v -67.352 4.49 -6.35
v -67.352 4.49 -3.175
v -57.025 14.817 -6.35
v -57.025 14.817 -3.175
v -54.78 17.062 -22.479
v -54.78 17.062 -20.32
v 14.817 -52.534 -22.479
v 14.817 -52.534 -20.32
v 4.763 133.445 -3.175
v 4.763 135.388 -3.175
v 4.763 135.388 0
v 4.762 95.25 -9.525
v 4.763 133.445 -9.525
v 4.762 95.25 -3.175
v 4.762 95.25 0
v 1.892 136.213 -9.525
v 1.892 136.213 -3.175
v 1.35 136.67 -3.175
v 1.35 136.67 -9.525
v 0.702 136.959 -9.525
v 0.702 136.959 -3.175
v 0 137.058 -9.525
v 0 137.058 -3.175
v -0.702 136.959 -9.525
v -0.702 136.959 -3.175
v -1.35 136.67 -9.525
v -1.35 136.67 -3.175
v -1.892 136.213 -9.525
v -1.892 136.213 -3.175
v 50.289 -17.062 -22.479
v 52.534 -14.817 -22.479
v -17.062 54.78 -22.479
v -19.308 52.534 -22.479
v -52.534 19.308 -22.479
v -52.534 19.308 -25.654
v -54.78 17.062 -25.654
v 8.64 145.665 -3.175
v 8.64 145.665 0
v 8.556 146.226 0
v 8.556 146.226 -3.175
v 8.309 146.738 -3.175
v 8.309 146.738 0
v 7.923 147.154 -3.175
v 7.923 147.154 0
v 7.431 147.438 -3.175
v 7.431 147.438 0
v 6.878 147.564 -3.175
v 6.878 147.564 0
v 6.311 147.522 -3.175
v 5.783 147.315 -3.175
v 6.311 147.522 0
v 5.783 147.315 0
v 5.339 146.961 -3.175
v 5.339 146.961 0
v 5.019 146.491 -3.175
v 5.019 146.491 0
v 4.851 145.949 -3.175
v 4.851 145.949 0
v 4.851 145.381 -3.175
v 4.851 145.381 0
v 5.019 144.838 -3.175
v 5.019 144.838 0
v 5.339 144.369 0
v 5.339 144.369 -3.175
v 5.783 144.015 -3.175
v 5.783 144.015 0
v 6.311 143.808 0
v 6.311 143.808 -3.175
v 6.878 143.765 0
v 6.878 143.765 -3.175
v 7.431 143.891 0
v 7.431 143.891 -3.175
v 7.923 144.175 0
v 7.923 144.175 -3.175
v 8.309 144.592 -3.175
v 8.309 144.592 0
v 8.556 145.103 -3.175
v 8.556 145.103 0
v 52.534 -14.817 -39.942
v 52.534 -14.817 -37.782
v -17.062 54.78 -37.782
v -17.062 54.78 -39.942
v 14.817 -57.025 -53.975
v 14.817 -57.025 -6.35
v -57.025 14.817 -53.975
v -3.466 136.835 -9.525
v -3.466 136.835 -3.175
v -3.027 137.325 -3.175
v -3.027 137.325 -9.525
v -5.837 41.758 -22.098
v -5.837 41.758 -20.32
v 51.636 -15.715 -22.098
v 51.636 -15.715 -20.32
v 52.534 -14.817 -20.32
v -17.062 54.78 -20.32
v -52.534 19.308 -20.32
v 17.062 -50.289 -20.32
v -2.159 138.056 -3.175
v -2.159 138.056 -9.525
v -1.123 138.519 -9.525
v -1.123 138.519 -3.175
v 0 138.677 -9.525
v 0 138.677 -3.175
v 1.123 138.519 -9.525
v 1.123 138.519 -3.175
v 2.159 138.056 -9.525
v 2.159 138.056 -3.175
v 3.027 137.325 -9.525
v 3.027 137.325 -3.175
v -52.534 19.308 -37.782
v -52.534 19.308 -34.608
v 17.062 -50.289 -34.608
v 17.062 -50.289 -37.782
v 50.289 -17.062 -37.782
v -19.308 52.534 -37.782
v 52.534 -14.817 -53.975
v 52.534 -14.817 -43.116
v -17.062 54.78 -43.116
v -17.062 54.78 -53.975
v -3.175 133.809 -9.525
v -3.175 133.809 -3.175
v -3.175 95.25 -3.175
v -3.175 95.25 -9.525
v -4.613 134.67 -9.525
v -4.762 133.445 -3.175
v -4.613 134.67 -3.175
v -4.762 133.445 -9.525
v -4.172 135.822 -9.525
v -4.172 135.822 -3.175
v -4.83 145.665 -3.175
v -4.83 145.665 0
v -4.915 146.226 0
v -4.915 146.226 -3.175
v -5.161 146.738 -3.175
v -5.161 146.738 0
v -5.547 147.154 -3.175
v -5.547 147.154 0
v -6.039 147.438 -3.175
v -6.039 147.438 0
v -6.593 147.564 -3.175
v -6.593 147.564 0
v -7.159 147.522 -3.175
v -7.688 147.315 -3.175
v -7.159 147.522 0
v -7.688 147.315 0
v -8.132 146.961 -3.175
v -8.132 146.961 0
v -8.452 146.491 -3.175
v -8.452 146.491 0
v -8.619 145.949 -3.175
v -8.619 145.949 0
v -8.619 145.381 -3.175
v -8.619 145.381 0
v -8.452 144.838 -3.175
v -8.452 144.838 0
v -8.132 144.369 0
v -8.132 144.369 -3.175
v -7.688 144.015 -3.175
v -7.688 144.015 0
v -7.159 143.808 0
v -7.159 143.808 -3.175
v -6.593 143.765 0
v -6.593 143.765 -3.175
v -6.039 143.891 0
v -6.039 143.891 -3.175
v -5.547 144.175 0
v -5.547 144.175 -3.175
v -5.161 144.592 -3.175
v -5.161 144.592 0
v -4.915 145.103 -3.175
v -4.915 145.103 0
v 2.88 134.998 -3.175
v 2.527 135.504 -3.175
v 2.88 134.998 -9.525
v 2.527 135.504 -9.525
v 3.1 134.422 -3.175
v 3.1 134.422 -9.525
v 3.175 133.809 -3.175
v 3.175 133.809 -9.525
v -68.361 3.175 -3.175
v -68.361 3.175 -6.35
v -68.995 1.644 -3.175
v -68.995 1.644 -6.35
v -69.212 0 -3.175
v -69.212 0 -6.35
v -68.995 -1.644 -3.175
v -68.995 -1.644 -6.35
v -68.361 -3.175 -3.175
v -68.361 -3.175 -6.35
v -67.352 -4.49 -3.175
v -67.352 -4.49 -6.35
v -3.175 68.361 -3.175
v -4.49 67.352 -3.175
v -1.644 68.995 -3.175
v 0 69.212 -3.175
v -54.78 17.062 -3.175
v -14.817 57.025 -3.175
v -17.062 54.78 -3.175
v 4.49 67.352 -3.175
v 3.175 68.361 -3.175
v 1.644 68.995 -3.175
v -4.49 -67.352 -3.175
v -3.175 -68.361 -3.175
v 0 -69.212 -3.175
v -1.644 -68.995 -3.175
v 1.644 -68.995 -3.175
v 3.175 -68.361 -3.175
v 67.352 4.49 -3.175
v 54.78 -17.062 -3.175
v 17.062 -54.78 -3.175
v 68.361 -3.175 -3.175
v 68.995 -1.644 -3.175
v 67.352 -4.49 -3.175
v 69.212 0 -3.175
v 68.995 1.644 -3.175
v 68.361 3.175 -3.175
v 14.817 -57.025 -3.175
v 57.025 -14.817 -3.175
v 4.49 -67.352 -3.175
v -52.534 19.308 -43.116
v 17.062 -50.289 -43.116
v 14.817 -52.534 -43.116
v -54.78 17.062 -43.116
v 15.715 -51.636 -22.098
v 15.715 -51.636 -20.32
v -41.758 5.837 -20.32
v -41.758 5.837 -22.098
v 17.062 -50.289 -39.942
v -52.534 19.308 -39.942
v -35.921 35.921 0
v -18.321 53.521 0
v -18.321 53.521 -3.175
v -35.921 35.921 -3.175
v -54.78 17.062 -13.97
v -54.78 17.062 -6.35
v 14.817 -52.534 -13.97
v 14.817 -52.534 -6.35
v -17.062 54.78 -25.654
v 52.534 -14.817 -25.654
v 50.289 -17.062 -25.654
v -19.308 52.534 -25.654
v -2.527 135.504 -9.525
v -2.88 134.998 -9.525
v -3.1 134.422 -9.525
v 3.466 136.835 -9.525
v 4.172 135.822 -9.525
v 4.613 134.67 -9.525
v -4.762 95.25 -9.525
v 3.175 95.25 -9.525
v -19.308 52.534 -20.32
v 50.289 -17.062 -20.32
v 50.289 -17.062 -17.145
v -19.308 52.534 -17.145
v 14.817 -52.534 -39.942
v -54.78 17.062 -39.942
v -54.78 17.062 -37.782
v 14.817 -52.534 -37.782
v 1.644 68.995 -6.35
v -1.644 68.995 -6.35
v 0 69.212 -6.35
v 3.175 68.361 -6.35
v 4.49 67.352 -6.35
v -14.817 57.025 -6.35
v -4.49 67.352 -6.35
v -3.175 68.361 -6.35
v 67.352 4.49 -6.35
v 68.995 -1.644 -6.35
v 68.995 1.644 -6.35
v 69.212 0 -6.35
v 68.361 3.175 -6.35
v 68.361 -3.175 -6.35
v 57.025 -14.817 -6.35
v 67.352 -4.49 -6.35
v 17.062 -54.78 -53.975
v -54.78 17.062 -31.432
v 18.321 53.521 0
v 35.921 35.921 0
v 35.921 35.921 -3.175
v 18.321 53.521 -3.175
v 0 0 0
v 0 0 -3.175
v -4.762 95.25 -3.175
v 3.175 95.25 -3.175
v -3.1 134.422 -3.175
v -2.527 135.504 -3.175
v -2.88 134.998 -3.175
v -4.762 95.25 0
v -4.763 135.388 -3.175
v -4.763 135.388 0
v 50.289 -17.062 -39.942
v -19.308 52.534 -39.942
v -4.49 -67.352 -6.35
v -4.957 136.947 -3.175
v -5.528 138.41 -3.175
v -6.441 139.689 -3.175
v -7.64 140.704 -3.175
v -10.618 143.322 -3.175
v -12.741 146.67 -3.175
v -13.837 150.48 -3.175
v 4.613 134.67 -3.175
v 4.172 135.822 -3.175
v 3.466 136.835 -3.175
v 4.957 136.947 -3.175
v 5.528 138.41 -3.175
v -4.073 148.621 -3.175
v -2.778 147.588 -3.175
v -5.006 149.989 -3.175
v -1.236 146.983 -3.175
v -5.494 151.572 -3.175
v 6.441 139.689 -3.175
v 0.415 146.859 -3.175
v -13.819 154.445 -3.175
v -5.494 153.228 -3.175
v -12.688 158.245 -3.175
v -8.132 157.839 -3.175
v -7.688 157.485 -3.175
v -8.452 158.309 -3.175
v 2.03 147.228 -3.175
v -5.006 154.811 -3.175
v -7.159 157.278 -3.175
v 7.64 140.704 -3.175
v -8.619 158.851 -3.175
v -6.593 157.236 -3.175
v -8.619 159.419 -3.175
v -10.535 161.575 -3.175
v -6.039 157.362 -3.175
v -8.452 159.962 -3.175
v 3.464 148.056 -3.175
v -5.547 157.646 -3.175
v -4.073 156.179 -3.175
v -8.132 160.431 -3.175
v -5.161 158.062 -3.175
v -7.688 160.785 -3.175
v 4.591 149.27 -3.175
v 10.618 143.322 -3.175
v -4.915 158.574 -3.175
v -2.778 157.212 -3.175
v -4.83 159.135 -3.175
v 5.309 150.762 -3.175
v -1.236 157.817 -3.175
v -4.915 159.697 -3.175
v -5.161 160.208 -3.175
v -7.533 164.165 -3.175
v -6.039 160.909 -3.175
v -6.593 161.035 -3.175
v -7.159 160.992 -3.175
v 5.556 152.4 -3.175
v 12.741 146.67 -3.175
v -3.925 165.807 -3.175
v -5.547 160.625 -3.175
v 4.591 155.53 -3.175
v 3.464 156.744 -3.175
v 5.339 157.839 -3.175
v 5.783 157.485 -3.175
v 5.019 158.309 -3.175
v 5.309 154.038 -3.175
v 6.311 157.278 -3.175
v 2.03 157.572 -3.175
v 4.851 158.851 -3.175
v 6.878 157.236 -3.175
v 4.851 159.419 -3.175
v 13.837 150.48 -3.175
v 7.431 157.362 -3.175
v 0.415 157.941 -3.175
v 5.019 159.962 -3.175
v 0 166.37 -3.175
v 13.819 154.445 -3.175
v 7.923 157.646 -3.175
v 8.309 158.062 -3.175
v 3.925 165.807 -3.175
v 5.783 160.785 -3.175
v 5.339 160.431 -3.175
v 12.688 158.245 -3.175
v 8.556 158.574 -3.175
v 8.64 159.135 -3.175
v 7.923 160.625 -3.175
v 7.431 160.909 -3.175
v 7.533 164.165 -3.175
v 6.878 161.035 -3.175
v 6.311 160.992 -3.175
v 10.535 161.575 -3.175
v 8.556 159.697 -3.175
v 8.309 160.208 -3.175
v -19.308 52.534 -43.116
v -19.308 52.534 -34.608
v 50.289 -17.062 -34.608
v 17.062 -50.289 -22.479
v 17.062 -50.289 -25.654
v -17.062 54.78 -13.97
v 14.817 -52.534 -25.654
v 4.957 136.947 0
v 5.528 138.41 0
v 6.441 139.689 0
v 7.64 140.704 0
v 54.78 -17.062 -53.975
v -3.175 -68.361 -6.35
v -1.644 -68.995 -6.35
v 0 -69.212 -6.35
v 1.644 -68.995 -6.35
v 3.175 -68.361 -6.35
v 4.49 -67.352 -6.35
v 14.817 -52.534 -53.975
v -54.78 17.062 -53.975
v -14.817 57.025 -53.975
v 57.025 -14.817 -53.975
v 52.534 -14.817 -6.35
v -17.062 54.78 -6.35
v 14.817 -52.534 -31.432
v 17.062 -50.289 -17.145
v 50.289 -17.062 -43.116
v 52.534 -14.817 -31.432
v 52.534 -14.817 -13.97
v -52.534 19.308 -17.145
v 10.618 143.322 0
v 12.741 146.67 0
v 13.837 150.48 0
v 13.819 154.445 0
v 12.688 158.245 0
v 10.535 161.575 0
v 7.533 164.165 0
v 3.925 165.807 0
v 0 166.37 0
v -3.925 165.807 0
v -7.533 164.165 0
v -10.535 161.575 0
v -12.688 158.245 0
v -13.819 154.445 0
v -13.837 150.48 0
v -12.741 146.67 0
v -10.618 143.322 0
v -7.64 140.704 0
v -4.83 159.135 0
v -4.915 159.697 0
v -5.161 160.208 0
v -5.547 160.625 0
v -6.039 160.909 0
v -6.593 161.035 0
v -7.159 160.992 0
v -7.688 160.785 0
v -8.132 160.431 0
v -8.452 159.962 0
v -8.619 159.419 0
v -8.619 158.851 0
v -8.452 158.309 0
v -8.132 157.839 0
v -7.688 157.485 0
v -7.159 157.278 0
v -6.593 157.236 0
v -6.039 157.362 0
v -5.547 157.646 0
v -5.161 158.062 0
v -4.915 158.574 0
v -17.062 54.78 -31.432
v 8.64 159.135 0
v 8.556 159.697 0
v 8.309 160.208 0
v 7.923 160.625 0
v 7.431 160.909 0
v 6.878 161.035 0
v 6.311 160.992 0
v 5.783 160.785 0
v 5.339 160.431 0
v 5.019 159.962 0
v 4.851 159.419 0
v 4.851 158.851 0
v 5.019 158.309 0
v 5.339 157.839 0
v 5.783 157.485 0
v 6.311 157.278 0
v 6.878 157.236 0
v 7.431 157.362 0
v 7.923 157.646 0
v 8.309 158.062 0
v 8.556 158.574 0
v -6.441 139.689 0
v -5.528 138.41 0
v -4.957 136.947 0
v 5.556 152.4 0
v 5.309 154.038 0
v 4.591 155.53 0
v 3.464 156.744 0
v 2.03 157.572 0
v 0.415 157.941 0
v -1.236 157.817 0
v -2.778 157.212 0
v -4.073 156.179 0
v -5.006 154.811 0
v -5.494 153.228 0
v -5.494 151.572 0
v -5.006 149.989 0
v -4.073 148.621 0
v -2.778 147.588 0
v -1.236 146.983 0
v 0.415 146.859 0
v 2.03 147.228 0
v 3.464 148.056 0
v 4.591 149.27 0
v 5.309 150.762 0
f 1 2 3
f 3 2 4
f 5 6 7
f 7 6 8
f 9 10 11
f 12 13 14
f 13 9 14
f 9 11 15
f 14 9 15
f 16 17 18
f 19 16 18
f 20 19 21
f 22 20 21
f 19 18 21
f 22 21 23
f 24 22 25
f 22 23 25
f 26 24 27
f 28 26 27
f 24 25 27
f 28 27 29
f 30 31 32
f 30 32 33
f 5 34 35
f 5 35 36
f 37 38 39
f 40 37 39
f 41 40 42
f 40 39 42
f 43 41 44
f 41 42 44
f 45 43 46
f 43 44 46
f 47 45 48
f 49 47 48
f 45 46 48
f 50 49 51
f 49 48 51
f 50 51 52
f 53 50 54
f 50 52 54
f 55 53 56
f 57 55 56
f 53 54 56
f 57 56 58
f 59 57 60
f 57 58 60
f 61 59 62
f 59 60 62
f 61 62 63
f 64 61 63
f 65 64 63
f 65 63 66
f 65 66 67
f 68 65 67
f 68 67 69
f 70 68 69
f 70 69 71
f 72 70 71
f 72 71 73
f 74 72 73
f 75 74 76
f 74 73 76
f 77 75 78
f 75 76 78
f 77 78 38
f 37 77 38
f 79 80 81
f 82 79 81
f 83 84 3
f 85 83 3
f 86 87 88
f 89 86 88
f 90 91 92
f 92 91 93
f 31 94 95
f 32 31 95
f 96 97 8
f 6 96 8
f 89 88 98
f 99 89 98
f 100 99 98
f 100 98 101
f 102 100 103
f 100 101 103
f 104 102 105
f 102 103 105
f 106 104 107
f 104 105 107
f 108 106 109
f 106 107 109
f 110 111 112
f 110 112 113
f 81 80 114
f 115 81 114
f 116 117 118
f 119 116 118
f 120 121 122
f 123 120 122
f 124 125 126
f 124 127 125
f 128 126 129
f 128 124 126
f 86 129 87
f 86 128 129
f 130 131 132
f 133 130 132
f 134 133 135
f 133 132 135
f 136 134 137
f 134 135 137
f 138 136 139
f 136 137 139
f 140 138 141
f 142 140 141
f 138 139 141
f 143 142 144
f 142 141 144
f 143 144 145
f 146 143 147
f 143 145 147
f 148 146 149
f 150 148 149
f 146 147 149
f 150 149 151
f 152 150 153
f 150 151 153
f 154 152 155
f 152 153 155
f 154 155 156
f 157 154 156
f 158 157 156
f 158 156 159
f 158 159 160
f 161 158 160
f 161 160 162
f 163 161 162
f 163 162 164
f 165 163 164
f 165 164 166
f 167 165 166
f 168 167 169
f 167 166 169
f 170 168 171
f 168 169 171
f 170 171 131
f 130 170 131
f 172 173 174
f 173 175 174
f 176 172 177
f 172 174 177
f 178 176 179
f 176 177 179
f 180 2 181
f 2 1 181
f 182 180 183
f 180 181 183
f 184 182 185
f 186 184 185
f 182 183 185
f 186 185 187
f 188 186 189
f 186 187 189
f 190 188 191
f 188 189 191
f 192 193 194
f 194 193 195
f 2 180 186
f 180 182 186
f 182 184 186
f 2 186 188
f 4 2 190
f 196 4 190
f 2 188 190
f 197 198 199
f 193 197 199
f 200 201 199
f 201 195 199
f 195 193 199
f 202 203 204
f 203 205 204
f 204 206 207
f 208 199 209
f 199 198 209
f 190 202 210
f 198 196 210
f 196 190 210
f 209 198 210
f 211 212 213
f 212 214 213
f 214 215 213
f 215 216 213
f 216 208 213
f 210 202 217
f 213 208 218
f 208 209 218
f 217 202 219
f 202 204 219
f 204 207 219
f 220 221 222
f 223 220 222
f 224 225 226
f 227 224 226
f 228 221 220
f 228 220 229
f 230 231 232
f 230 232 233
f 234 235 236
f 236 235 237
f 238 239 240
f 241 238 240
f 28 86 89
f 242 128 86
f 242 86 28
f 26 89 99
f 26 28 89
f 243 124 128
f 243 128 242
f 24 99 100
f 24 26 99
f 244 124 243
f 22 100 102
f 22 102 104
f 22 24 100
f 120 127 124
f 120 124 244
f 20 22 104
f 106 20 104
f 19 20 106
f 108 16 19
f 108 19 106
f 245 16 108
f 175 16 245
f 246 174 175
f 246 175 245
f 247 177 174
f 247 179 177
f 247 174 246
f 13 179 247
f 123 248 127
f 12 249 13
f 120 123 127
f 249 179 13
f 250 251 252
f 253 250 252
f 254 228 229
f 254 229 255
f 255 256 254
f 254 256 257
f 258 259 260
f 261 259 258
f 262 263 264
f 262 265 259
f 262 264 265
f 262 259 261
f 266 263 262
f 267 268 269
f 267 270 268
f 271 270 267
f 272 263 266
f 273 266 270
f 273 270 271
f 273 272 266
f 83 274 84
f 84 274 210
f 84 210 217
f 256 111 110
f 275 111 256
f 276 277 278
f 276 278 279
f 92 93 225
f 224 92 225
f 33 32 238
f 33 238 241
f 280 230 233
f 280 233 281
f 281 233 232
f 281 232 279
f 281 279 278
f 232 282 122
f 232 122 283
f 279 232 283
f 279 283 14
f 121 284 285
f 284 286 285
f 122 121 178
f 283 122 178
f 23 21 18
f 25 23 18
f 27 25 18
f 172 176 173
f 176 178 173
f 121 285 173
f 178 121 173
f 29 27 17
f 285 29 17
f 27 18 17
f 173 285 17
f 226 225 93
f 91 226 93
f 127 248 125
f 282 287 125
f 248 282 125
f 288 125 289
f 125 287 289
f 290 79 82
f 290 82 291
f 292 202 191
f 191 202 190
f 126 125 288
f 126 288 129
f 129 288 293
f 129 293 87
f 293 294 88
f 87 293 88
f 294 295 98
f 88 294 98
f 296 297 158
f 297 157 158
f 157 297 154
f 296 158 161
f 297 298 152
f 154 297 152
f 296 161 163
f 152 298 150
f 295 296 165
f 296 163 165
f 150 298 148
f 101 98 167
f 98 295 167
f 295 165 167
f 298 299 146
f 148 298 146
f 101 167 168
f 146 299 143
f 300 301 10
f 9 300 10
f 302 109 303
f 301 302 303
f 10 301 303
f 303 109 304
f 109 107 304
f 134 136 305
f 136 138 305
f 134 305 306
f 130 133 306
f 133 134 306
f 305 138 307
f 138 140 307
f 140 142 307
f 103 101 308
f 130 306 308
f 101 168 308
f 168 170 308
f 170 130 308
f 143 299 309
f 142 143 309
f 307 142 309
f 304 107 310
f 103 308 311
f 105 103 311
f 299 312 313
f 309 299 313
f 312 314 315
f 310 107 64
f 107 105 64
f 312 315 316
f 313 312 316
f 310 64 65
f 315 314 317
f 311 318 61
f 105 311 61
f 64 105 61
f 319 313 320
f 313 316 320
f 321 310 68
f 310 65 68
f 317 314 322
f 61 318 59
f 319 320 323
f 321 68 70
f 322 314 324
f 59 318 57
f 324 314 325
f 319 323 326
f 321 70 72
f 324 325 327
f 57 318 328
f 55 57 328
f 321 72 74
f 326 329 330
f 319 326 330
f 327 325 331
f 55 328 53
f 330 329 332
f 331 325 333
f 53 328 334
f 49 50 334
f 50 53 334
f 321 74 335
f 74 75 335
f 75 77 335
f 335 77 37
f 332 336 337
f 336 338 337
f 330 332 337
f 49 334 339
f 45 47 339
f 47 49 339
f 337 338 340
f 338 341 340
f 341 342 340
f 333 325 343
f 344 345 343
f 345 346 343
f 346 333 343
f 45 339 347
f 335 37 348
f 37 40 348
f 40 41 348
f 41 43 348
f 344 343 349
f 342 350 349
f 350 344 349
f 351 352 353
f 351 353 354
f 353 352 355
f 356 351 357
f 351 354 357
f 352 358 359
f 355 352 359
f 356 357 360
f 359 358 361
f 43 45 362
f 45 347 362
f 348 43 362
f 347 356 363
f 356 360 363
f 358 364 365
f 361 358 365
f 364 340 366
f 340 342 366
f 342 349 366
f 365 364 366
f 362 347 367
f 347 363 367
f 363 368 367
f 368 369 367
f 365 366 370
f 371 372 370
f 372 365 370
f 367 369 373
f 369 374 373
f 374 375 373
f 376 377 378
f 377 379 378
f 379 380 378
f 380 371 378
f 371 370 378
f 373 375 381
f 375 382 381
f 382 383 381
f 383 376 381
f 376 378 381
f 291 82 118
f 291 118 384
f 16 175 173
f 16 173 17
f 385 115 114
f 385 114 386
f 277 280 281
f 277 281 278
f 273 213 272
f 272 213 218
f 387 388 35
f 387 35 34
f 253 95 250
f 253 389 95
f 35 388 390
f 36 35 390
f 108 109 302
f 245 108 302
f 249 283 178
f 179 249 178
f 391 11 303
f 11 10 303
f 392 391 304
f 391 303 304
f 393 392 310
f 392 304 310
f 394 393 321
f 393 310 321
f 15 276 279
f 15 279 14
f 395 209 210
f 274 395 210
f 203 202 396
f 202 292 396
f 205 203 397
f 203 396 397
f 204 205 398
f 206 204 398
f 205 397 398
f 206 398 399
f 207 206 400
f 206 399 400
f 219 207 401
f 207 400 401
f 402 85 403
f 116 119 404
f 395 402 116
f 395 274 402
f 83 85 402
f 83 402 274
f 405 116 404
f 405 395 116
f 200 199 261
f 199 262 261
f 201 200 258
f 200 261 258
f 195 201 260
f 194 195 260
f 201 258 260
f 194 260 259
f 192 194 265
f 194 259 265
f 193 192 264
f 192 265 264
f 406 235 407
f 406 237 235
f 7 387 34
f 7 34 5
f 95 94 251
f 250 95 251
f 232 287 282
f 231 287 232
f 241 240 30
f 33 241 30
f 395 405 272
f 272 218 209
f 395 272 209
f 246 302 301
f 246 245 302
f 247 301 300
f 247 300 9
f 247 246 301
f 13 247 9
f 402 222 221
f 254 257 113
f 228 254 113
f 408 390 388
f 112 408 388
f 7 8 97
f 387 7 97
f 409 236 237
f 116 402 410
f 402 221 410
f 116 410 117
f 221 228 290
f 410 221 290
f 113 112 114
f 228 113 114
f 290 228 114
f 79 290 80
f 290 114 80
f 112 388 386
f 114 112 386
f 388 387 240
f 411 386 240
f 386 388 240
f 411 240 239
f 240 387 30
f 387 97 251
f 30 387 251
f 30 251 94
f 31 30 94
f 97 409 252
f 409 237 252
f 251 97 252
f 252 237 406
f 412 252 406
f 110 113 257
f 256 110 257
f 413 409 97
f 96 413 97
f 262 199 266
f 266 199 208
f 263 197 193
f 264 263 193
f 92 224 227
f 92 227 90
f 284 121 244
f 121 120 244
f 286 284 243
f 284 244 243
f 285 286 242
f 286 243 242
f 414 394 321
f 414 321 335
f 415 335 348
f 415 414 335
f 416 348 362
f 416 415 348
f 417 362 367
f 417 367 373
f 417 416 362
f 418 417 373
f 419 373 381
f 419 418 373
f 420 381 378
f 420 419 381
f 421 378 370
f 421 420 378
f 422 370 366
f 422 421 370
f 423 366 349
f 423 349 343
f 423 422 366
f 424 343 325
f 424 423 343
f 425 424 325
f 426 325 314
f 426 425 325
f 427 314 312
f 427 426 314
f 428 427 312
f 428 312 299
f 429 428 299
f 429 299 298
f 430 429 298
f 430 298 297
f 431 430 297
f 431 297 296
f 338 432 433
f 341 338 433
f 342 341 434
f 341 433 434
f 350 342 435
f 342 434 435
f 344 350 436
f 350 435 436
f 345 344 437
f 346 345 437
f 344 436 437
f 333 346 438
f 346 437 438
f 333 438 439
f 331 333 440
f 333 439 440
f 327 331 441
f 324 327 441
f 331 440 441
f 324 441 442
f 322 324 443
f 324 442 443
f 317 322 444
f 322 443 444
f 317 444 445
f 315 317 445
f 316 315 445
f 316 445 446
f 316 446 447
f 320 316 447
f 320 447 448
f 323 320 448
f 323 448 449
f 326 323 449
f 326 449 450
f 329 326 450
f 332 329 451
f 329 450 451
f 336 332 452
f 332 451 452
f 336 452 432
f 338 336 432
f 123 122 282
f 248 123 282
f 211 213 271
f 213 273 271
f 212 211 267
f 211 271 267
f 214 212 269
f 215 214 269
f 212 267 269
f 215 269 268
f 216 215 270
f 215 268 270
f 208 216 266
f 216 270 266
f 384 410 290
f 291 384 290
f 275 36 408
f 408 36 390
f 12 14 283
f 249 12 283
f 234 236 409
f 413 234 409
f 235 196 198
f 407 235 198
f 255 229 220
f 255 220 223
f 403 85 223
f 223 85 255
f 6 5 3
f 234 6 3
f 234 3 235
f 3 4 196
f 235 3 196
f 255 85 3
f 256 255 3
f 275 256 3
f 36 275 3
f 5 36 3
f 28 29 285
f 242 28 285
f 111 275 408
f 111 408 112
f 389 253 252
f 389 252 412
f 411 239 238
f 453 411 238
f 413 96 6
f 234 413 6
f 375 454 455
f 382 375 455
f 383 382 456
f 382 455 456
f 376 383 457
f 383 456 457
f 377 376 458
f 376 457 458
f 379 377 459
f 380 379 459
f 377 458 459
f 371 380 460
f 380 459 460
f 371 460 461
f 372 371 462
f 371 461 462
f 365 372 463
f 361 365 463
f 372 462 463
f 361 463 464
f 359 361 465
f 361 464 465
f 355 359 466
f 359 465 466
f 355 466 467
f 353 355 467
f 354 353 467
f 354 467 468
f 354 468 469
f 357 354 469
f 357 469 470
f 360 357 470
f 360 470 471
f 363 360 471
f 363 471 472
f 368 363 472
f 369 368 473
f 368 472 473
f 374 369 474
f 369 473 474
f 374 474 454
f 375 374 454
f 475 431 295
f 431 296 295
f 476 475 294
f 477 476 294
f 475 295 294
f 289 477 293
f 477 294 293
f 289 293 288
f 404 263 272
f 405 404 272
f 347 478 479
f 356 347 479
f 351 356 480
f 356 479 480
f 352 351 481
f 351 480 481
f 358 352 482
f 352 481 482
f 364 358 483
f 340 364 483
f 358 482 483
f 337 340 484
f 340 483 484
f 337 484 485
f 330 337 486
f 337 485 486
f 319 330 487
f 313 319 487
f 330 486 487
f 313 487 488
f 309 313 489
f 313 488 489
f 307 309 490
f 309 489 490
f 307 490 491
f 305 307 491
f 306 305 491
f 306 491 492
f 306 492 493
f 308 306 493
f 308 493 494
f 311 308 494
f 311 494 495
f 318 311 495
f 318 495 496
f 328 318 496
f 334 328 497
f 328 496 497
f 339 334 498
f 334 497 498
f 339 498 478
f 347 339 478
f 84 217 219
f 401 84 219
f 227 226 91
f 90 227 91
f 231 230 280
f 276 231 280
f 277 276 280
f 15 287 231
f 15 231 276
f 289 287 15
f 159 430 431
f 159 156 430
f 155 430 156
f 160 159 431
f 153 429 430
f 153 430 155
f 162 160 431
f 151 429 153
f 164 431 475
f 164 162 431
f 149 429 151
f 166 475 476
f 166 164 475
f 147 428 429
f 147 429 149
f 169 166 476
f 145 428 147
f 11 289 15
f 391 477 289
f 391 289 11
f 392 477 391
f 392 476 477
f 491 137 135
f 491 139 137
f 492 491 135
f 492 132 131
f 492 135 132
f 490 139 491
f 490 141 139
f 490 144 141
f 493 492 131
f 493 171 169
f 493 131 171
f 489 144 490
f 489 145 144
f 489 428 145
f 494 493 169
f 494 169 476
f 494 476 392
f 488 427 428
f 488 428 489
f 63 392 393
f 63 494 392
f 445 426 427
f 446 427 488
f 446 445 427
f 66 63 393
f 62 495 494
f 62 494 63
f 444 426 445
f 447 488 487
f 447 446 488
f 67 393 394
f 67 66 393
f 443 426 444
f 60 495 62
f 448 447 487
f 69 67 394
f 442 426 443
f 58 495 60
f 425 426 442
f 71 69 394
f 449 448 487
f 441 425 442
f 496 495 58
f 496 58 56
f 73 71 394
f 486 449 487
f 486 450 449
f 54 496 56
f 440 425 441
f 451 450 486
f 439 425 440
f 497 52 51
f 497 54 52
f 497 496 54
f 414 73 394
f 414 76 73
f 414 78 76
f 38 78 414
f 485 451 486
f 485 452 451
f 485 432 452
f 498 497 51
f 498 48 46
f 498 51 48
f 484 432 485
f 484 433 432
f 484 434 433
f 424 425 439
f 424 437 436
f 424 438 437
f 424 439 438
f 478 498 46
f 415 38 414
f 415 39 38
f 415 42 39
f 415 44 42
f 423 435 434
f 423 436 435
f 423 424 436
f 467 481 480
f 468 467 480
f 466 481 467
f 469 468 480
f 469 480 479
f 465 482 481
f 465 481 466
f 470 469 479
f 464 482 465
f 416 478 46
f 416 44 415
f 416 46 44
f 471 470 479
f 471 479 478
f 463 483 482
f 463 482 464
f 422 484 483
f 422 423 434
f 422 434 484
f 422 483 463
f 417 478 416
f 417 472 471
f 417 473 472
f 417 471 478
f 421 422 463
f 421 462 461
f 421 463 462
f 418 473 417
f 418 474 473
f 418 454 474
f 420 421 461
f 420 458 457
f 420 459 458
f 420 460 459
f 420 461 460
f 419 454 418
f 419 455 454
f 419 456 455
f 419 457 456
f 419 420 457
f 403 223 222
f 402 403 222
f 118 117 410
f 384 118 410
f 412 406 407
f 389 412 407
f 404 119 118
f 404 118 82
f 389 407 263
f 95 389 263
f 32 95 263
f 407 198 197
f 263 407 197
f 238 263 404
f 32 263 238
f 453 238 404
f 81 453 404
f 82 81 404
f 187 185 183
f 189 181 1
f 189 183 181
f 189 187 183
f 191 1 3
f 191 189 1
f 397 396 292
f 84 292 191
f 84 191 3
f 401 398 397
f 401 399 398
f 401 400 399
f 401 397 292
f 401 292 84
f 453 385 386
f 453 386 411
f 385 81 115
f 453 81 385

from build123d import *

# Parameters (mm, degrees)
F0_R      = 1.905
F0_R_2    = 5.55625
F1_DEPTH  = 3.175
F3_DEPTH  = 50.8
F4_W      = 3.175
F4_H      = 3.175
F5_DEPTH  = 98.425
F7_DEPTH  = 1.778
F9_DEPTH  = 3.175
F10_R     = 6.35
F12_DEPTH = 6.35
F13_R     = 5.08
F14_R     = 2.54
F15_R     = 6.35


with BuildPart() as f1:
    # F0 (on Top) → F1 (new body)
    with BuildSketch(Plane.XY):
        with BuildLine():
            Line((4.7625, 95.25), (4.7625, 139.2668551462))
            ThreePointArc((4.7625, 139.2668551462), (0, 166.37), (-4.7625, 139.2668551462))
            Line((-4.7625, 139.2668551462), (-4.7625, 95.25))
            Line((-4.7625, 95.25), (-18.3210860538, 53.5209629147))
            Line((-18.3210860538, 53.5209629147), (-35.9210244843, 35.9210244843))
            Line((-35.9210244843, 35.9210244843), (0, 0))
            Line((0, 0), (35.9210244843, 35.9210244843))
            Line((35.9210244843, 35.9210244843), (18.3210860538, 53.5209629147))
            Line((18.3210860538, 53.5209629147), (4.7625, 95.25))
        make_face()
        with Locations((-6.7351920908, 145.6648079092)):
            Circle(F0_R, mode=Mode.SUBTRACT)
        with Locations((0, 152.4)):
            Circle(F0_R_2, mode=Mode.SUBTRACT)
        with Locations((-6.7351920908, 159.1351920908)):
            Circle(F0_R, mode=Mode.SUBTRACT)
        with Locations((6.7351920908, 145.6648079092)):
            Circle(F0_R, mode=Mode.SUBTRACT)
        with Locations((6.7351920908, 159.1351920908)):
            Circle(F0_R, mode=Mode.SUBTRACT)
    extrude(amount=-F1_DEPTH)

    # F10
    f10_edges = [f1.edges().sort_by_distance(p)[0] for p in [
        (-4.7625, 139.266855, -1.5875),
        (4.7625, 139.266855, -1.5875),
    ]]
    fillet(f10_edges, radius=F10_R)

    # F11 (on face) → F12 (join)
    with BuildSketch(Plane(origin=(0, 0, -3.175), x_dir=(1, 0, 0), z_dir=(0, 0, -1))):
        with BuildLine():
            Line((-3.175, -95.25), (-4.7625, -95.25))
            Line((-4.7625, -95.25), (-4.7625, -135.3878060277))
            Line((-4.7625, -135.3878060277), (-3.0270188015, -137.3250988614))
            ThreePointArc((-3.0270188015, -137.3250988614), (0, -138.6774106095), (3.0270188015, -137.3250988614))
            Line((3.0270188015, -137.3250988614), (4.7625, -135.3878060277))
            Line((4.7625, -135.3878060277), (4.7625, -95.25))
            Line((4.7625, -95.25), (3.175, -95.25))
            Line((3.175, -95.25), (3.175, -134.7807275217))
            Line((3.175, -134.7807275217), (1.8918867509, -136.2130484851))
            ThreePointArc((1.8918867509, -136.2130484851), (0, -137.0582433277), (-1.8918867509, -136.2130484851))
            Line((-1.8918867509, -136.2130484851), (-3.175, -134.7807275217))
            Line((-3.175, -134.7807275217), (-3.175, -95.25))
        make_face()
    extrude(amount=F12_DEPTH)

    # F13
    f13_edges = [f1.edges().sort_by_distance(p)[0] for p in [
        (-4.7625, 135.387806, -6.35),
        (4.7625, 135.387806, -6.35),
    ]]
    fillet(f13_edges, radius=F13_R)

    # F14
    f14_edges = [f1.edges().sort_by_distance(p)[0] for p in [
        (3.175, 134.780728, -6.35),
        (-3.175, 134.780728, -6.35),
    ]]
    fillet(f14_edges, radius=F14_R)


with BuildPart() as f3:
    # F2 (on face) → F3 (new body)
    with BuildSketch(Plane(origin=(0, 0, -3.175), x_dir=(1, 0, 0), z_dir=(0, 0, -1))):
        Polygon((17.06248663, 54.7795623385), (14.8174225998, 57.0246263688), (-57.0246263688, -14.8174225998), (-54.7795623385, -17.06248663), (14.8174225998, 52.5344983083), (52.5344983083, 14.8174225998), (-17.06248663, -54.7795623385), (-14.8174225998, -57.0246263688), (57.0246263688, 14.8174225998), (54.7795623385, 17.06248663), align=None)
    extrude(amount=F3_DEPTH)

    # F4 (on face) → F5 (join, through all)
    with BuildSketch(Plane(origin=(-35.9210244843, 35.9210244843, 0), x_dir=(-0.7071067812, -0.7071067812, 0), z_dir=(-0.7071067812, 0.7071067812, 0))):
        Polygon((-26.67, -19.05), (-26.67, -20.32), (-23.495, -20.32), (-23.495, -17.145), (-26.67, -13.97), align=None)
        with Locations((-25.0825, -24.0665)):
            Rectangle(F4_W, F4_H)
        with Locations((25.0825, -24.0665)):
            Rectangle(F4_W, F4_H)
        Polygon((26.67, -13.97), (23.495, -17.145), (23.495, -20.32), (26.67, -20.32), (26.67, -19.05), align=None)
        with Locations((-25.0825, -41.529)):
            Rectangle(F4_W, F4_H)
        Polygon((-26.67, -31.4325), (-26.67, -36.5125), (-26.67, -37.7825), (-23.495, -37.7825), (-23.495, -34.6075), align=None)
        Polygon((26.67, -37.7825), (26.67, -36.5125), (26.67, -31.4325), (23.495, -34.6075), (23.495, -37.7825), align=None)
        with Locations((25.0825, -41.529)):
            Rectangle(F4_W, F4_H)
    extrude(amount=-F5_DEPTH)

    # F8 (on face) → F9 (join)
    with BuildSketch(Plane(origin=(0, 0, -3.175), x_dir=(1, 0, 0), z_dir=(0, 0, -1))):
        Polygon((71.8420489686, 0), (0, 71.8420489686), (-71.8420489686, 0), (0, -71.8420489686), align=None)
    extrude(amount=F9_DEPTH)

    # F15
    f15_edges = [f3.edges().sort_by_distance(p)[0] for p in [
        (0, 71.842049, -4.7625),
        (-71.842049, 0, -4.7625),
        (0, -71.842049, -4.7625),
        (71.842049, 0, -4.7625),
    ]]
    fillet(f15_edges, radius=F15_R)


with BuildPart() as f7:
    # F6 (on face) → F7 (new body)
    with BuildSketch(Plane(origin=(0, 0, -20.32), x_dir=(1, 0, 0), z_dir=(0, 0, -1))):
        Polygon((51.6364726961, 15.7154482119), (15.7154482119, 51.6364726961), (-41.758190963, -5.8371664787), (-5.8371664787, -41.758190963), align=None)
    extrude(amount=F7_DEPTH)


solid = Compound([f1.part, f3.part, f7.part])
